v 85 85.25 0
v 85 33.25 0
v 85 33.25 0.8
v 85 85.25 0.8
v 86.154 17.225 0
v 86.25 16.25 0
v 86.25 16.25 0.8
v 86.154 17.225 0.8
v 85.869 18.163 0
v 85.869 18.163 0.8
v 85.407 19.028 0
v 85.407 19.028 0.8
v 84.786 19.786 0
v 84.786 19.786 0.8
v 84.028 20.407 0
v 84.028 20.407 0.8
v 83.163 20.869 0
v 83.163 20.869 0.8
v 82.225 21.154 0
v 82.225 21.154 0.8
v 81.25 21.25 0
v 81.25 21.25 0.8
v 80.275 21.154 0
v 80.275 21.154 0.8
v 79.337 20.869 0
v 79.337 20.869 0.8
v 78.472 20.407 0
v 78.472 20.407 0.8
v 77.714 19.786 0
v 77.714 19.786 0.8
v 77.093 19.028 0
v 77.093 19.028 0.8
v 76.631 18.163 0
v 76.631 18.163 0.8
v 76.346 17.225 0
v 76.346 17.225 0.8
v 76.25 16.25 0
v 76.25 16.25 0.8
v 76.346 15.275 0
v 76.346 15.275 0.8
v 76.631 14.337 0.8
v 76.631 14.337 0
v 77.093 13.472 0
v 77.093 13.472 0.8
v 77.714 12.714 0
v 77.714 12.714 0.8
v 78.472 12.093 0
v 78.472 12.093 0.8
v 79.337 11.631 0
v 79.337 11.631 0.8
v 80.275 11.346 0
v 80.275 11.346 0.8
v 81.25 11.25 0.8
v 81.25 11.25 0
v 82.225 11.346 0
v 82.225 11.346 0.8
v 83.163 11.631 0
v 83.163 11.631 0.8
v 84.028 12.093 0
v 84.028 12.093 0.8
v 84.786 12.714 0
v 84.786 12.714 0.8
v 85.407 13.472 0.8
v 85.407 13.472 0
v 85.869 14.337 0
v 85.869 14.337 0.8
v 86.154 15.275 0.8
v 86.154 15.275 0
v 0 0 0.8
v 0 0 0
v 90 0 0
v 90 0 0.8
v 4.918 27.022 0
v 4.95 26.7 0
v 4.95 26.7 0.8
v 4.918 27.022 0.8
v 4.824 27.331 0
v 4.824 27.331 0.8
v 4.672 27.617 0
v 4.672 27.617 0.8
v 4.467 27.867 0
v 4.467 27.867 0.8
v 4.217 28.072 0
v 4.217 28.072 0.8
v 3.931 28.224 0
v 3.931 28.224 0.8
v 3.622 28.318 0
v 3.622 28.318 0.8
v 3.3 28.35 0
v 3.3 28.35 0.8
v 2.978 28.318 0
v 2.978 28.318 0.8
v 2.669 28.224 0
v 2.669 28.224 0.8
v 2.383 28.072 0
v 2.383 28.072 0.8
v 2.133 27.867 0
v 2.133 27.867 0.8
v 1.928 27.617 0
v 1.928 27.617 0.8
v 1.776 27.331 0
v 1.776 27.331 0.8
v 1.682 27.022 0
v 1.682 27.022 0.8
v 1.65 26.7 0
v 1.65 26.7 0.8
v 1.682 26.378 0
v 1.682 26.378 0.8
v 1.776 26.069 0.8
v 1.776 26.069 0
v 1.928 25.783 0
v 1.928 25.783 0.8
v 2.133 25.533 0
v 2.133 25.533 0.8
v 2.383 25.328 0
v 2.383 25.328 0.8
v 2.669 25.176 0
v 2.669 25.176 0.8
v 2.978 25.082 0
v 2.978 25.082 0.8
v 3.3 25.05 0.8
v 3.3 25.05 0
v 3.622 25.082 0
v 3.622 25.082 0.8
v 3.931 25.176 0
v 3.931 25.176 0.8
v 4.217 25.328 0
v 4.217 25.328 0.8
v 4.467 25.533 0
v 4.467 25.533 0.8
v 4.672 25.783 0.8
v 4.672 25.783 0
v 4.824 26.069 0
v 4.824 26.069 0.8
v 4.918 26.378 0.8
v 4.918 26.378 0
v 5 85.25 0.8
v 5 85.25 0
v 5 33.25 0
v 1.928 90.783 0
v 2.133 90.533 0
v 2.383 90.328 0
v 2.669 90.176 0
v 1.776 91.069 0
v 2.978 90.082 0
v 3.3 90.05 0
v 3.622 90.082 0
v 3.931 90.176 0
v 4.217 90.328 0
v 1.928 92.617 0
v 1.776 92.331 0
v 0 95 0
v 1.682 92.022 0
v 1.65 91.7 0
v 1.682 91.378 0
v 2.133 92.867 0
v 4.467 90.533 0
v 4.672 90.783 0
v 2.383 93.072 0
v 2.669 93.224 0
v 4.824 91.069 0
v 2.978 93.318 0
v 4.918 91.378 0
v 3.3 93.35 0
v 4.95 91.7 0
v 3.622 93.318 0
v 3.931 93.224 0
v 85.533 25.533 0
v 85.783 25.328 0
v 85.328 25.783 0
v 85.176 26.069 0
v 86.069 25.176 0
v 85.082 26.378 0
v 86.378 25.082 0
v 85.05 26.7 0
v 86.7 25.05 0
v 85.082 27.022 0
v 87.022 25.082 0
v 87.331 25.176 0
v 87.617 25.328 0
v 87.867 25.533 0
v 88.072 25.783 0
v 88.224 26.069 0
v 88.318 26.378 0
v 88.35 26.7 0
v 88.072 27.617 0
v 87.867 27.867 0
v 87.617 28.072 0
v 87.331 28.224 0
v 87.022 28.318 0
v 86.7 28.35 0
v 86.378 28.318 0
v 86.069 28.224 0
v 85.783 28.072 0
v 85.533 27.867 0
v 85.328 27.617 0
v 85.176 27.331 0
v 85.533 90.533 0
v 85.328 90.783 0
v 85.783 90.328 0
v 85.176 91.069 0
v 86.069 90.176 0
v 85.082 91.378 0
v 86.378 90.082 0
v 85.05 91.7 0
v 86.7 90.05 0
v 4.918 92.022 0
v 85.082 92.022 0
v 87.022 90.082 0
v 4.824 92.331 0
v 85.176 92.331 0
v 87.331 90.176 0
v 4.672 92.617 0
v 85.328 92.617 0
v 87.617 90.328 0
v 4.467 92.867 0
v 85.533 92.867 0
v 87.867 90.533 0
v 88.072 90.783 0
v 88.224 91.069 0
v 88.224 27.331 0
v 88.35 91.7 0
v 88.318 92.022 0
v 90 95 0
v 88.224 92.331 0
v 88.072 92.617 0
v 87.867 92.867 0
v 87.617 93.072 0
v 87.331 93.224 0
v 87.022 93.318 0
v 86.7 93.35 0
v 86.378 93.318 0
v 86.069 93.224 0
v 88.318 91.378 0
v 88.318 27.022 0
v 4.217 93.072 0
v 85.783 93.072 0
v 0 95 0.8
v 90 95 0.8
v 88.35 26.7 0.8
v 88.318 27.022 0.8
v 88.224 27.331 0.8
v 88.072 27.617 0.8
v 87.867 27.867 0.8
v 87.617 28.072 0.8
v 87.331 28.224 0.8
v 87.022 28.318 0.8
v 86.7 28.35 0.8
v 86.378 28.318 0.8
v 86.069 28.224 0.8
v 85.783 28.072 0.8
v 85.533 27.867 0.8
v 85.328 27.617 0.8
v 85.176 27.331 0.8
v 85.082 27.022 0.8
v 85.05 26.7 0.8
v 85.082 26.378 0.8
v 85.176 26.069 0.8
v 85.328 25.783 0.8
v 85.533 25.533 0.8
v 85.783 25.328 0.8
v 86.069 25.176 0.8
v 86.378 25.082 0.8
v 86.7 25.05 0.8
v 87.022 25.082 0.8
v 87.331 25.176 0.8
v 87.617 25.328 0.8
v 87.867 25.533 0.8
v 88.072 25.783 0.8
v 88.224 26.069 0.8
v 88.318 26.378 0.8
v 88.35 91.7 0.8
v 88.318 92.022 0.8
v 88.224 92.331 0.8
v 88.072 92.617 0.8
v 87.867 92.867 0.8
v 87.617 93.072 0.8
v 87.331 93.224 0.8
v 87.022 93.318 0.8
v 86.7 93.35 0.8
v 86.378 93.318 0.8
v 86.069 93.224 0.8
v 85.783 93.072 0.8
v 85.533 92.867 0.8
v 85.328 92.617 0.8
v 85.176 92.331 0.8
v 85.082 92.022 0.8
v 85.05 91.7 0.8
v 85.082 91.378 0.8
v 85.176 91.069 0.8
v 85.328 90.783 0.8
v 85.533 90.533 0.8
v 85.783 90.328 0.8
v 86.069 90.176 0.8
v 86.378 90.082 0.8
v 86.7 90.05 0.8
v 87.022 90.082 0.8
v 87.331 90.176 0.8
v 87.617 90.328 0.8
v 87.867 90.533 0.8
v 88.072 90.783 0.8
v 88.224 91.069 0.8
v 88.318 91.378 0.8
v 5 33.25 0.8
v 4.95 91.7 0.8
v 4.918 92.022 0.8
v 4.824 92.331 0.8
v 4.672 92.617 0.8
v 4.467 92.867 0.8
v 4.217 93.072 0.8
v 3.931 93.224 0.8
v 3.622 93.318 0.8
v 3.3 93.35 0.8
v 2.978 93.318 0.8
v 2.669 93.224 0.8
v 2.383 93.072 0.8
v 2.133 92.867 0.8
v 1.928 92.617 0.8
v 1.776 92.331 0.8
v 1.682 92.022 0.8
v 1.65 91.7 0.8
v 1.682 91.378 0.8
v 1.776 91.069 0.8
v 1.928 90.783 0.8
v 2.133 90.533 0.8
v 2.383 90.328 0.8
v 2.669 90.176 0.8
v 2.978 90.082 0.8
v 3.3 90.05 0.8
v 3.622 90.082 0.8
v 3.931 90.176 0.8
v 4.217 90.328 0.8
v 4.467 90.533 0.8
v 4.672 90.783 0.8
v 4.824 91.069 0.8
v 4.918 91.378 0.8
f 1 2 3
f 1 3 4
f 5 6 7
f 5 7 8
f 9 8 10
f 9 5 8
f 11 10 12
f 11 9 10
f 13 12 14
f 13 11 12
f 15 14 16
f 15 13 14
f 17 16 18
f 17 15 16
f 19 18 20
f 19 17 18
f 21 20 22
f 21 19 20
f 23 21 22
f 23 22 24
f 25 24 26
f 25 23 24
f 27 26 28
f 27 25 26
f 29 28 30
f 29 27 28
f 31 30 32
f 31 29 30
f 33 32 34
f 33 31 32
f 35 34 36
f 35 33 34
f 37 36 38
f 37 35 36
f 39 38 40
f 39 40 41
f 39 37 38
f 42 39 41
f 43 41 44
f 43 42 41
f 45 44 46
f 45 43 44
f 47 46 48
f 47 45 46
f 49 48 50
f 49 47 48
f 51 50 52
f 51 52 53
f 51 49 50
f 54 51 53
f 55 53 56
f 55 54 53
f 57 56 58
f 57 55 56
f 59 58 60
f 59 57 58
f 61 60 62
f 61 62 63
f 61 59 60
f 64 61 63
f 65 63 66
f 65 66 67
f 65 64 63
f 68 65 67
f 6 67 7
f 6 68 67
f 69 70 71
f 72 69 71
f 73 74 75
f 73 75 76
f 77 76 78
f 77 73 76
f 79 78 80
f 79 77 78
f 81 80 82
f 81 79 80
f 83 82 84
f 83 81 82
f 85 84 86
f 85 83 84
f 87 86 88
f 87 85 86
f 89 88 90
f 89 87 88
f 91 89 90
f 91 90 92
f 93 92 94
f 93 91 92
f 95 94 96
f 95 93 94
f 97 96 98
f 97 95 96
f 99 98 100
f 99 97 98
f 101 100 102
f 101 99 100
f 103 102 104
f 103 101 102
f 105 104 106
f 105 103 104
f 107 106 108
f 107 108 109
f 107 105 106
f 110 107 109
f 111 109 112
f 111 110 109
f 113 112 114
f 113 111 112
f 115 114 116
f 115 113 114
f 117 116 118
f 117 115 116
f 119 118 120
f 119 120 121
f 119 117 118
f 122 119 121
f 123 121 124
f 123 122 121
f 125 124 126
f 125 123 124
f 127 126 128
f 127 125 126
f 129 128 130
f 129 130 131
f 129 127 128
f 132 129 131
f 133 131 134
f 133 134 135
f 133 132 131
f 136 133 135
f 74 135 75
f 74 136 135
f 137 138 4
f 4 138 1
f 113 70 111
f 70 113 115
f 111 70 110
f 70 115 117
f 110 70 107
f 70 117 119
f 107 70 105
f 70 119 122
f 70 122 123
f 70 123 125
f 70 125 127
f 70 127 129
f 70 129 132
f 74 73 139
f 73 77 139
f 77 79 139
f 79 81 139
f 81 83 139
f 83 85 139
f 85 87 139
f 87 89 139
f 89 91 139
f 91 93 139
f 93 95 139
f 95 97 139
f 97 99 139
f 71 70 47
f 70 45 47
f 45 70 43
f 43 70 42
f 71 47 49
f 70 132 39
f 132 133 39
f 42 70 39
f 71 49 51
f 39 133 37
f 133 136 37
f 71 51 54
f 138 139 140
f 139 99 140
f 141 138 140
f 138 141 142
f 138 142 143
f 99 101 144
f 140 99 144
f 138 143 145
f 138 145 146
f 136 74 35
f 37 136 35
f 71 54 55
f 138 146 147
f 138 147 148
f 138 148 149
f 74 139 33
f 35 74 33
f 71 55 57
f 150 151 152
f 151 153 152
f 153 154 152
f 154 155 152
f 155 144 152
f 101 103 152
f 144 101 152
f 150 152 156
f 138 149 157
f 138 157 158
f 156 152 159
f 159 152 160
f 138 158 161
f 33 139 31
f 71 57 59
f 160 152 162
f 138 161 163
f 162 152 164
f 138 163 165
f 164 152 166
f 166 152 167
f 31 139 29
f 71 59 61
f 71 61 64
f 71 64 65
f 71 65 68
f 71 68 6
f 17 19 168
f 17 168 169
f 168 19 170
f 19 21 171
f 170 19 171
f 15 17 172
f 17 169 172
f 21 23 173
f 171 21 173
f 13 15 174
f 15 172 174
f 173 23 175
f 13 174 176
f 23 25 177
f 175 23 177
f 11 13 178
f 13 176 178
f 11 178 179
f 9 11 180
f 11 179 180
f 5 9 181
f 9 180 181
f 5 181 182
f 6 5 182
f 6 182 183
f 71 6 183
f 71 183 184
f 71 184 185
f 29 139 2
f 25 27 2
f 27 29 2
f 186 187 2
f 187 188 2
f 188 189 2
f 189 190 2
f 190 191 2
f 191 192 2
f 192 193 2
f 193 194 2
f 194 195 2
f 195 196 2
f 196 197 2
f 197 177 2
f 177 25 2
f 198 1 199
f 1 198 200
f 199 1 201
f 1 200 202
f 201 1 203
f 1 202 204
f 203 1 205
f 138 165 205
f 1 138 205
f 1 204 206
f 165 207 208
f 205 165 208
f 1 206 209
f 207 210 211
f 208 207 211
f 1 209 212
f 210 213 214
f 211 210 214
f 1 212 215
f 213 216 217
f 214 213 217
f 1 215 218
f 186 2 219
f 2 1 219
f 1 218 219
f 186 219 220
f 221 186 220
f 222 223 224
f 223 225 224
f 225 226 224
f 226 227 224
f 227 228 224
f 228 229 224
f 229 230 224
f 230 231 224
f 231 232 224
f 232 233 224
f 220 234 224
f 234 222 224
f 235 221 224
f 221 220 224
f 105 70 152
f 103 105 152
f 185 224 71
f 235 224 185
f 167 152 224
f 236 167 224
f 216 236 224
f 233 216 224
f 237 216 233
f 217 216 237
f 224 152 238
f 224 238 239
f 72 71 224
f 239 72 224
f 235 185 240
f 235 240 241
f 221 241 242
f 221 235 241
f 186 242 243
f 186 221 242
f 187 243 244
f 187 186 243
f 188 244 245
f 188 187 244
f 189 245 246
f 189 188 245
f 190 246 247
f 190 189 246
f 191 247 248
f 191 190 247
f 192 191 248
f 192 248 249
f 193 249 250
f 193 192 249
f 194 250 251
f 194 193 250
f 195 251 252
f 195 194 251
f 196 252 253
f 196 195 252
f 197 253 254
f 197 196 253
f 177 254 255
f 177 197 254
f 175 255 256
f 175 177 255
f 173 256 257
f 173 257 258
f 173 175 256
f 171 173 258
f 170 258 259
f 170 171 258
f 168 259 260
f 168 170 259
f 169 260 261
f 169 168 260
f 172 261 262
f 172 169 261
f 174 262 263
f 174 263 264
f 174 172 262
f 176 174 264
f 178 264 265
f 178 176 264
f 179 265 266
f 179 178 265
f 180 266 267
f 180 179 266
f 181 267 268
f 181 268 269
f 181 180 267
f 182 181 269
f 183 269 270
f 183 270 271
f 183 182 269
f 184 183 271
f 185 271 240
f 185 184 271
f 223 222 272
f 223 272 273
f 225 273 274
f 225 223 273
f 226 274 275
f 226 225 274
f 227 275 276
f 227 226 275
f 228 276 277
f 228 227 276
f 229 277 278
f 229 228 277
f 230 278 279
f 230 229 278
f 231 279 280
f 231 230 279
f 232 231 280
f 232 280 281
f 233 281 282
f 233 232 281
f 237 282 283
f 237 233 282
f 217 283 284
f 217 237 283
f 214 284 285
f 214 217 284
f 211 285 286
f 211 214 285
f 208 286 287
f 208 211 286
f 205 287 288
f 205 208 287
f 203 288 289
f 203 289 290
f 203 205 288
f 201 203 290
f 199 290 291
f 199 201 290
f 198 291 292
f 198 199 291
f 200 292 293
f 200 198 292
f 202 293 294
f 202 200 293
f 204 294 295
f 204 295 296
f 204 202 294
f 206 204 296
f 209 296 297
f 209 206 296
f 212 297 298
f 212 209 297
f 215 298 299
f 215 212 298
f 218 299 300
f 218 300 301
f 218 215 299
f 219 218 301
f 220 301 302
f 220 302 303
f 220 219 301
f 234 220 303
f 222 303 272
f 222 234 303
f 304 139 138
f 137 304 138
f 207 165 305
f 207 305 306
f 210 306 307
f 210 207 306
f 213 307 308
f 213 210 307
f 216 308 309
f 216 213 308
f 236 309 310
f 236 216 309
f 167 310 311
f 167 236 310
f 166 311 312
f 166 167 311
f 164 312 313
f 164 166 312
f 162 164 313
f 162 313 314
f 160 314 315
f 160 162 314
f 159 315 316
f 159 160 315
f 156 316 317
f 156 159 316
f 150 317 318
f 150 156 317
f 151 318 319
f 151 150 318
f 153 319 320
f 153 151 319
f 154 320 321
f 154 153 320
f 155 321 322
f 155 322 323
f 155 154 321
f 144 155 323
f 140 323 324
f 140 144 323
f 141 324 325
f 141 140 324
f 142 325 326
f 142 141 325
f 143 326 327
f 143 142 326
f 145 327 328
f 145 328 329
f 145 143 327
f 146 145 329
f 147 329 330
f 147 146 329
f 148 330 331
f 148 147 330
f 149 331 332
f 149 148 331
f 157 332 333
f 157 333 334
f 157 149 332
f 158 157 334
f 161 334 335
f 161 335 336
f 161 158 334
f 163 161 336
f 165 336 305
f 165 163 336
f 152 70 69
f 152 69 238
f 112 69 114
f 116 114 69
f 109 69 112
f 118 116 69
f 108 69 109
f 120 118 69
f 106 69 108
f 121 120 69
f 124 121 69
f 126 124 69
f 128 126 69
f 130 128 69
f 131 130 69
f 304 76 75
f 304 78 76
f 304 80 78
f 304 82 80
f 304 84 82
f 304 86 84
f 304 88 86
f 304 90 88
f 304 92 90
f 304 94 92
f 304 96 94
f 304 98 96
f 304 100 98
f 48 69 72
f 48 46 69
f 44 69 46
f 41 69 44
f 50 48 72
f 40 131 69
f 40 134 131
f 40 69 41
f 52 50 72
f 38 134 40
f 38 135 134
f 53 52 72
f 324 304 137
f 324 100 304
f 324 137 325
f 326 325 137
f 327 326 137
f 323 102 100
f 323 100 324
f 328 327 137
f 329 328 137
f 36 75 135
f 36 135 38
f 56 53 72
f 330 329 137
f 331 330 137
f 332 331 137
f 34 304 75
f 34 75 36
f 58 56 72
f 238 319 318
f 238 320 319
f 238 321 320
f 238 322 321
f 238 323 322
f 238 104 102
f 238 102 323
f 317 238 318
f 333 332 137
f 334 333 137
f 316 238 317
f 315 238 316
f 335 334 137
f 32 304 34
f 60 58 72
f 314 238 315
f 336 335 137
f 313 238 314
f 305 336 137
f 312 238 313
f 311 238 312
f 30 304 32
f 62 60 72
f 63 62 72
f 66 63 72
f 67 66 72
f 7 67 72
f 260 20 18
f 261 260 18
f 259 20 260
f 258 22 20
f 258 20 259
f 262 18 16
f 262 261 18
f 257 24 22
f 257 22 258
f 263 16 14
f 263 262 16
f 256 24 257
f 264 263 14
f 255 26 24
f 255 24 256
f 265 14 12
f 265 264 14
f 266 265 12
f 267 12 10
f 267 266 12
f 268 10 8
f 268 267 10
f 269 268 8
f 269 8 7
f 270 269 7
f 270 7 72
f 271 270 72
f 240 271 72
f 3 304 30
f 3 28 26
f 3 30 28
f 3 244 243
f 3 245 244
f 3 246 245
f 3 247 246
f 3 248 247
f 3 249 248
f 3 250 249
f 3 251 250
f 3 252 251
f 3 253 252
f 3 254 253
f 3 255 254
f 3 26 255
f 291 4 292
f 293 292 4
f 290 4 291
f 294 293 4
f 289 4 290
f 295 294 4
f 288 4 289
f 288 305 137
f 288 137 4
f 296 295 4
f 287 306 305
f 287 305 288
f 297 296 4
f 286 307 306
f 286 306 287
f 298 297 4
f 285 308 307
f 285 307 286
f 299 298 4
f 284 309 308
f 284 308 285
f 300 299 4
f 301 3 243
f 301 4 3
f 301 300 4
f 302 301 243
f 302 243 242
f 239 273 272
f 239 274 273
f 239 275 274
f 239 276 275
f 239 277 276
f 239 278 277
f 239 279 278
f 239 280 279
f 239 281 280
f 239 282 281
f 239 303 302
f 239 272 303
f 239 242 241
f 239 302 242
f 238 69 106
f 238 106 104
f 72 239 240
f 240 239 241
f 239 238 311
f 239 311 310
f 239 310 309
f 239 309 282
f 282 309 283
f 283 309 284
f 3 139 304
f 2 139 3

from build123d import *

# Parameters (mm, degrees)
F0_W     = 90
F0_H     = 95
F0_R     = 1.65
F0_R_2   = 5
F0_W_2   = 80
F0_H_2   = 52
F1_DEPTH = 0.8


with BuildPart() as f1:
    # F0 (on Top) → F1 (new body)
    with BuildSketch(Plane.XY):
        with Locations((45, 47.5)):
            Rectangle(F0_W, F0_H)
        with Locations((3.3, 26.7)):
            Circle(F0_R, mode=Mode.SUBTRACT)
        with Locations((81.25, 16.25)):
            Circle(F0_R_2, mode=Mode.SUBTRACT)
        with Locations((86.7, 26.7)):
            Circle(F0_R, mode=Mode.SUBTRACT)
        with Locations((3.3, 91.7)):
            Circle(F0_R, mode=Mode.SUBTRACT)
        with Locations((45, 59.25)):
            Rectangle(F0_W_2, F0_H_2, mode=Mode.SUBTRACT)
        with Locations((86.7, 91.7)):
            Circle(F0_R, mode=Mode.SUBTRACT)
    extrude(amount=F1_DEPTH)


solid = f1.part
